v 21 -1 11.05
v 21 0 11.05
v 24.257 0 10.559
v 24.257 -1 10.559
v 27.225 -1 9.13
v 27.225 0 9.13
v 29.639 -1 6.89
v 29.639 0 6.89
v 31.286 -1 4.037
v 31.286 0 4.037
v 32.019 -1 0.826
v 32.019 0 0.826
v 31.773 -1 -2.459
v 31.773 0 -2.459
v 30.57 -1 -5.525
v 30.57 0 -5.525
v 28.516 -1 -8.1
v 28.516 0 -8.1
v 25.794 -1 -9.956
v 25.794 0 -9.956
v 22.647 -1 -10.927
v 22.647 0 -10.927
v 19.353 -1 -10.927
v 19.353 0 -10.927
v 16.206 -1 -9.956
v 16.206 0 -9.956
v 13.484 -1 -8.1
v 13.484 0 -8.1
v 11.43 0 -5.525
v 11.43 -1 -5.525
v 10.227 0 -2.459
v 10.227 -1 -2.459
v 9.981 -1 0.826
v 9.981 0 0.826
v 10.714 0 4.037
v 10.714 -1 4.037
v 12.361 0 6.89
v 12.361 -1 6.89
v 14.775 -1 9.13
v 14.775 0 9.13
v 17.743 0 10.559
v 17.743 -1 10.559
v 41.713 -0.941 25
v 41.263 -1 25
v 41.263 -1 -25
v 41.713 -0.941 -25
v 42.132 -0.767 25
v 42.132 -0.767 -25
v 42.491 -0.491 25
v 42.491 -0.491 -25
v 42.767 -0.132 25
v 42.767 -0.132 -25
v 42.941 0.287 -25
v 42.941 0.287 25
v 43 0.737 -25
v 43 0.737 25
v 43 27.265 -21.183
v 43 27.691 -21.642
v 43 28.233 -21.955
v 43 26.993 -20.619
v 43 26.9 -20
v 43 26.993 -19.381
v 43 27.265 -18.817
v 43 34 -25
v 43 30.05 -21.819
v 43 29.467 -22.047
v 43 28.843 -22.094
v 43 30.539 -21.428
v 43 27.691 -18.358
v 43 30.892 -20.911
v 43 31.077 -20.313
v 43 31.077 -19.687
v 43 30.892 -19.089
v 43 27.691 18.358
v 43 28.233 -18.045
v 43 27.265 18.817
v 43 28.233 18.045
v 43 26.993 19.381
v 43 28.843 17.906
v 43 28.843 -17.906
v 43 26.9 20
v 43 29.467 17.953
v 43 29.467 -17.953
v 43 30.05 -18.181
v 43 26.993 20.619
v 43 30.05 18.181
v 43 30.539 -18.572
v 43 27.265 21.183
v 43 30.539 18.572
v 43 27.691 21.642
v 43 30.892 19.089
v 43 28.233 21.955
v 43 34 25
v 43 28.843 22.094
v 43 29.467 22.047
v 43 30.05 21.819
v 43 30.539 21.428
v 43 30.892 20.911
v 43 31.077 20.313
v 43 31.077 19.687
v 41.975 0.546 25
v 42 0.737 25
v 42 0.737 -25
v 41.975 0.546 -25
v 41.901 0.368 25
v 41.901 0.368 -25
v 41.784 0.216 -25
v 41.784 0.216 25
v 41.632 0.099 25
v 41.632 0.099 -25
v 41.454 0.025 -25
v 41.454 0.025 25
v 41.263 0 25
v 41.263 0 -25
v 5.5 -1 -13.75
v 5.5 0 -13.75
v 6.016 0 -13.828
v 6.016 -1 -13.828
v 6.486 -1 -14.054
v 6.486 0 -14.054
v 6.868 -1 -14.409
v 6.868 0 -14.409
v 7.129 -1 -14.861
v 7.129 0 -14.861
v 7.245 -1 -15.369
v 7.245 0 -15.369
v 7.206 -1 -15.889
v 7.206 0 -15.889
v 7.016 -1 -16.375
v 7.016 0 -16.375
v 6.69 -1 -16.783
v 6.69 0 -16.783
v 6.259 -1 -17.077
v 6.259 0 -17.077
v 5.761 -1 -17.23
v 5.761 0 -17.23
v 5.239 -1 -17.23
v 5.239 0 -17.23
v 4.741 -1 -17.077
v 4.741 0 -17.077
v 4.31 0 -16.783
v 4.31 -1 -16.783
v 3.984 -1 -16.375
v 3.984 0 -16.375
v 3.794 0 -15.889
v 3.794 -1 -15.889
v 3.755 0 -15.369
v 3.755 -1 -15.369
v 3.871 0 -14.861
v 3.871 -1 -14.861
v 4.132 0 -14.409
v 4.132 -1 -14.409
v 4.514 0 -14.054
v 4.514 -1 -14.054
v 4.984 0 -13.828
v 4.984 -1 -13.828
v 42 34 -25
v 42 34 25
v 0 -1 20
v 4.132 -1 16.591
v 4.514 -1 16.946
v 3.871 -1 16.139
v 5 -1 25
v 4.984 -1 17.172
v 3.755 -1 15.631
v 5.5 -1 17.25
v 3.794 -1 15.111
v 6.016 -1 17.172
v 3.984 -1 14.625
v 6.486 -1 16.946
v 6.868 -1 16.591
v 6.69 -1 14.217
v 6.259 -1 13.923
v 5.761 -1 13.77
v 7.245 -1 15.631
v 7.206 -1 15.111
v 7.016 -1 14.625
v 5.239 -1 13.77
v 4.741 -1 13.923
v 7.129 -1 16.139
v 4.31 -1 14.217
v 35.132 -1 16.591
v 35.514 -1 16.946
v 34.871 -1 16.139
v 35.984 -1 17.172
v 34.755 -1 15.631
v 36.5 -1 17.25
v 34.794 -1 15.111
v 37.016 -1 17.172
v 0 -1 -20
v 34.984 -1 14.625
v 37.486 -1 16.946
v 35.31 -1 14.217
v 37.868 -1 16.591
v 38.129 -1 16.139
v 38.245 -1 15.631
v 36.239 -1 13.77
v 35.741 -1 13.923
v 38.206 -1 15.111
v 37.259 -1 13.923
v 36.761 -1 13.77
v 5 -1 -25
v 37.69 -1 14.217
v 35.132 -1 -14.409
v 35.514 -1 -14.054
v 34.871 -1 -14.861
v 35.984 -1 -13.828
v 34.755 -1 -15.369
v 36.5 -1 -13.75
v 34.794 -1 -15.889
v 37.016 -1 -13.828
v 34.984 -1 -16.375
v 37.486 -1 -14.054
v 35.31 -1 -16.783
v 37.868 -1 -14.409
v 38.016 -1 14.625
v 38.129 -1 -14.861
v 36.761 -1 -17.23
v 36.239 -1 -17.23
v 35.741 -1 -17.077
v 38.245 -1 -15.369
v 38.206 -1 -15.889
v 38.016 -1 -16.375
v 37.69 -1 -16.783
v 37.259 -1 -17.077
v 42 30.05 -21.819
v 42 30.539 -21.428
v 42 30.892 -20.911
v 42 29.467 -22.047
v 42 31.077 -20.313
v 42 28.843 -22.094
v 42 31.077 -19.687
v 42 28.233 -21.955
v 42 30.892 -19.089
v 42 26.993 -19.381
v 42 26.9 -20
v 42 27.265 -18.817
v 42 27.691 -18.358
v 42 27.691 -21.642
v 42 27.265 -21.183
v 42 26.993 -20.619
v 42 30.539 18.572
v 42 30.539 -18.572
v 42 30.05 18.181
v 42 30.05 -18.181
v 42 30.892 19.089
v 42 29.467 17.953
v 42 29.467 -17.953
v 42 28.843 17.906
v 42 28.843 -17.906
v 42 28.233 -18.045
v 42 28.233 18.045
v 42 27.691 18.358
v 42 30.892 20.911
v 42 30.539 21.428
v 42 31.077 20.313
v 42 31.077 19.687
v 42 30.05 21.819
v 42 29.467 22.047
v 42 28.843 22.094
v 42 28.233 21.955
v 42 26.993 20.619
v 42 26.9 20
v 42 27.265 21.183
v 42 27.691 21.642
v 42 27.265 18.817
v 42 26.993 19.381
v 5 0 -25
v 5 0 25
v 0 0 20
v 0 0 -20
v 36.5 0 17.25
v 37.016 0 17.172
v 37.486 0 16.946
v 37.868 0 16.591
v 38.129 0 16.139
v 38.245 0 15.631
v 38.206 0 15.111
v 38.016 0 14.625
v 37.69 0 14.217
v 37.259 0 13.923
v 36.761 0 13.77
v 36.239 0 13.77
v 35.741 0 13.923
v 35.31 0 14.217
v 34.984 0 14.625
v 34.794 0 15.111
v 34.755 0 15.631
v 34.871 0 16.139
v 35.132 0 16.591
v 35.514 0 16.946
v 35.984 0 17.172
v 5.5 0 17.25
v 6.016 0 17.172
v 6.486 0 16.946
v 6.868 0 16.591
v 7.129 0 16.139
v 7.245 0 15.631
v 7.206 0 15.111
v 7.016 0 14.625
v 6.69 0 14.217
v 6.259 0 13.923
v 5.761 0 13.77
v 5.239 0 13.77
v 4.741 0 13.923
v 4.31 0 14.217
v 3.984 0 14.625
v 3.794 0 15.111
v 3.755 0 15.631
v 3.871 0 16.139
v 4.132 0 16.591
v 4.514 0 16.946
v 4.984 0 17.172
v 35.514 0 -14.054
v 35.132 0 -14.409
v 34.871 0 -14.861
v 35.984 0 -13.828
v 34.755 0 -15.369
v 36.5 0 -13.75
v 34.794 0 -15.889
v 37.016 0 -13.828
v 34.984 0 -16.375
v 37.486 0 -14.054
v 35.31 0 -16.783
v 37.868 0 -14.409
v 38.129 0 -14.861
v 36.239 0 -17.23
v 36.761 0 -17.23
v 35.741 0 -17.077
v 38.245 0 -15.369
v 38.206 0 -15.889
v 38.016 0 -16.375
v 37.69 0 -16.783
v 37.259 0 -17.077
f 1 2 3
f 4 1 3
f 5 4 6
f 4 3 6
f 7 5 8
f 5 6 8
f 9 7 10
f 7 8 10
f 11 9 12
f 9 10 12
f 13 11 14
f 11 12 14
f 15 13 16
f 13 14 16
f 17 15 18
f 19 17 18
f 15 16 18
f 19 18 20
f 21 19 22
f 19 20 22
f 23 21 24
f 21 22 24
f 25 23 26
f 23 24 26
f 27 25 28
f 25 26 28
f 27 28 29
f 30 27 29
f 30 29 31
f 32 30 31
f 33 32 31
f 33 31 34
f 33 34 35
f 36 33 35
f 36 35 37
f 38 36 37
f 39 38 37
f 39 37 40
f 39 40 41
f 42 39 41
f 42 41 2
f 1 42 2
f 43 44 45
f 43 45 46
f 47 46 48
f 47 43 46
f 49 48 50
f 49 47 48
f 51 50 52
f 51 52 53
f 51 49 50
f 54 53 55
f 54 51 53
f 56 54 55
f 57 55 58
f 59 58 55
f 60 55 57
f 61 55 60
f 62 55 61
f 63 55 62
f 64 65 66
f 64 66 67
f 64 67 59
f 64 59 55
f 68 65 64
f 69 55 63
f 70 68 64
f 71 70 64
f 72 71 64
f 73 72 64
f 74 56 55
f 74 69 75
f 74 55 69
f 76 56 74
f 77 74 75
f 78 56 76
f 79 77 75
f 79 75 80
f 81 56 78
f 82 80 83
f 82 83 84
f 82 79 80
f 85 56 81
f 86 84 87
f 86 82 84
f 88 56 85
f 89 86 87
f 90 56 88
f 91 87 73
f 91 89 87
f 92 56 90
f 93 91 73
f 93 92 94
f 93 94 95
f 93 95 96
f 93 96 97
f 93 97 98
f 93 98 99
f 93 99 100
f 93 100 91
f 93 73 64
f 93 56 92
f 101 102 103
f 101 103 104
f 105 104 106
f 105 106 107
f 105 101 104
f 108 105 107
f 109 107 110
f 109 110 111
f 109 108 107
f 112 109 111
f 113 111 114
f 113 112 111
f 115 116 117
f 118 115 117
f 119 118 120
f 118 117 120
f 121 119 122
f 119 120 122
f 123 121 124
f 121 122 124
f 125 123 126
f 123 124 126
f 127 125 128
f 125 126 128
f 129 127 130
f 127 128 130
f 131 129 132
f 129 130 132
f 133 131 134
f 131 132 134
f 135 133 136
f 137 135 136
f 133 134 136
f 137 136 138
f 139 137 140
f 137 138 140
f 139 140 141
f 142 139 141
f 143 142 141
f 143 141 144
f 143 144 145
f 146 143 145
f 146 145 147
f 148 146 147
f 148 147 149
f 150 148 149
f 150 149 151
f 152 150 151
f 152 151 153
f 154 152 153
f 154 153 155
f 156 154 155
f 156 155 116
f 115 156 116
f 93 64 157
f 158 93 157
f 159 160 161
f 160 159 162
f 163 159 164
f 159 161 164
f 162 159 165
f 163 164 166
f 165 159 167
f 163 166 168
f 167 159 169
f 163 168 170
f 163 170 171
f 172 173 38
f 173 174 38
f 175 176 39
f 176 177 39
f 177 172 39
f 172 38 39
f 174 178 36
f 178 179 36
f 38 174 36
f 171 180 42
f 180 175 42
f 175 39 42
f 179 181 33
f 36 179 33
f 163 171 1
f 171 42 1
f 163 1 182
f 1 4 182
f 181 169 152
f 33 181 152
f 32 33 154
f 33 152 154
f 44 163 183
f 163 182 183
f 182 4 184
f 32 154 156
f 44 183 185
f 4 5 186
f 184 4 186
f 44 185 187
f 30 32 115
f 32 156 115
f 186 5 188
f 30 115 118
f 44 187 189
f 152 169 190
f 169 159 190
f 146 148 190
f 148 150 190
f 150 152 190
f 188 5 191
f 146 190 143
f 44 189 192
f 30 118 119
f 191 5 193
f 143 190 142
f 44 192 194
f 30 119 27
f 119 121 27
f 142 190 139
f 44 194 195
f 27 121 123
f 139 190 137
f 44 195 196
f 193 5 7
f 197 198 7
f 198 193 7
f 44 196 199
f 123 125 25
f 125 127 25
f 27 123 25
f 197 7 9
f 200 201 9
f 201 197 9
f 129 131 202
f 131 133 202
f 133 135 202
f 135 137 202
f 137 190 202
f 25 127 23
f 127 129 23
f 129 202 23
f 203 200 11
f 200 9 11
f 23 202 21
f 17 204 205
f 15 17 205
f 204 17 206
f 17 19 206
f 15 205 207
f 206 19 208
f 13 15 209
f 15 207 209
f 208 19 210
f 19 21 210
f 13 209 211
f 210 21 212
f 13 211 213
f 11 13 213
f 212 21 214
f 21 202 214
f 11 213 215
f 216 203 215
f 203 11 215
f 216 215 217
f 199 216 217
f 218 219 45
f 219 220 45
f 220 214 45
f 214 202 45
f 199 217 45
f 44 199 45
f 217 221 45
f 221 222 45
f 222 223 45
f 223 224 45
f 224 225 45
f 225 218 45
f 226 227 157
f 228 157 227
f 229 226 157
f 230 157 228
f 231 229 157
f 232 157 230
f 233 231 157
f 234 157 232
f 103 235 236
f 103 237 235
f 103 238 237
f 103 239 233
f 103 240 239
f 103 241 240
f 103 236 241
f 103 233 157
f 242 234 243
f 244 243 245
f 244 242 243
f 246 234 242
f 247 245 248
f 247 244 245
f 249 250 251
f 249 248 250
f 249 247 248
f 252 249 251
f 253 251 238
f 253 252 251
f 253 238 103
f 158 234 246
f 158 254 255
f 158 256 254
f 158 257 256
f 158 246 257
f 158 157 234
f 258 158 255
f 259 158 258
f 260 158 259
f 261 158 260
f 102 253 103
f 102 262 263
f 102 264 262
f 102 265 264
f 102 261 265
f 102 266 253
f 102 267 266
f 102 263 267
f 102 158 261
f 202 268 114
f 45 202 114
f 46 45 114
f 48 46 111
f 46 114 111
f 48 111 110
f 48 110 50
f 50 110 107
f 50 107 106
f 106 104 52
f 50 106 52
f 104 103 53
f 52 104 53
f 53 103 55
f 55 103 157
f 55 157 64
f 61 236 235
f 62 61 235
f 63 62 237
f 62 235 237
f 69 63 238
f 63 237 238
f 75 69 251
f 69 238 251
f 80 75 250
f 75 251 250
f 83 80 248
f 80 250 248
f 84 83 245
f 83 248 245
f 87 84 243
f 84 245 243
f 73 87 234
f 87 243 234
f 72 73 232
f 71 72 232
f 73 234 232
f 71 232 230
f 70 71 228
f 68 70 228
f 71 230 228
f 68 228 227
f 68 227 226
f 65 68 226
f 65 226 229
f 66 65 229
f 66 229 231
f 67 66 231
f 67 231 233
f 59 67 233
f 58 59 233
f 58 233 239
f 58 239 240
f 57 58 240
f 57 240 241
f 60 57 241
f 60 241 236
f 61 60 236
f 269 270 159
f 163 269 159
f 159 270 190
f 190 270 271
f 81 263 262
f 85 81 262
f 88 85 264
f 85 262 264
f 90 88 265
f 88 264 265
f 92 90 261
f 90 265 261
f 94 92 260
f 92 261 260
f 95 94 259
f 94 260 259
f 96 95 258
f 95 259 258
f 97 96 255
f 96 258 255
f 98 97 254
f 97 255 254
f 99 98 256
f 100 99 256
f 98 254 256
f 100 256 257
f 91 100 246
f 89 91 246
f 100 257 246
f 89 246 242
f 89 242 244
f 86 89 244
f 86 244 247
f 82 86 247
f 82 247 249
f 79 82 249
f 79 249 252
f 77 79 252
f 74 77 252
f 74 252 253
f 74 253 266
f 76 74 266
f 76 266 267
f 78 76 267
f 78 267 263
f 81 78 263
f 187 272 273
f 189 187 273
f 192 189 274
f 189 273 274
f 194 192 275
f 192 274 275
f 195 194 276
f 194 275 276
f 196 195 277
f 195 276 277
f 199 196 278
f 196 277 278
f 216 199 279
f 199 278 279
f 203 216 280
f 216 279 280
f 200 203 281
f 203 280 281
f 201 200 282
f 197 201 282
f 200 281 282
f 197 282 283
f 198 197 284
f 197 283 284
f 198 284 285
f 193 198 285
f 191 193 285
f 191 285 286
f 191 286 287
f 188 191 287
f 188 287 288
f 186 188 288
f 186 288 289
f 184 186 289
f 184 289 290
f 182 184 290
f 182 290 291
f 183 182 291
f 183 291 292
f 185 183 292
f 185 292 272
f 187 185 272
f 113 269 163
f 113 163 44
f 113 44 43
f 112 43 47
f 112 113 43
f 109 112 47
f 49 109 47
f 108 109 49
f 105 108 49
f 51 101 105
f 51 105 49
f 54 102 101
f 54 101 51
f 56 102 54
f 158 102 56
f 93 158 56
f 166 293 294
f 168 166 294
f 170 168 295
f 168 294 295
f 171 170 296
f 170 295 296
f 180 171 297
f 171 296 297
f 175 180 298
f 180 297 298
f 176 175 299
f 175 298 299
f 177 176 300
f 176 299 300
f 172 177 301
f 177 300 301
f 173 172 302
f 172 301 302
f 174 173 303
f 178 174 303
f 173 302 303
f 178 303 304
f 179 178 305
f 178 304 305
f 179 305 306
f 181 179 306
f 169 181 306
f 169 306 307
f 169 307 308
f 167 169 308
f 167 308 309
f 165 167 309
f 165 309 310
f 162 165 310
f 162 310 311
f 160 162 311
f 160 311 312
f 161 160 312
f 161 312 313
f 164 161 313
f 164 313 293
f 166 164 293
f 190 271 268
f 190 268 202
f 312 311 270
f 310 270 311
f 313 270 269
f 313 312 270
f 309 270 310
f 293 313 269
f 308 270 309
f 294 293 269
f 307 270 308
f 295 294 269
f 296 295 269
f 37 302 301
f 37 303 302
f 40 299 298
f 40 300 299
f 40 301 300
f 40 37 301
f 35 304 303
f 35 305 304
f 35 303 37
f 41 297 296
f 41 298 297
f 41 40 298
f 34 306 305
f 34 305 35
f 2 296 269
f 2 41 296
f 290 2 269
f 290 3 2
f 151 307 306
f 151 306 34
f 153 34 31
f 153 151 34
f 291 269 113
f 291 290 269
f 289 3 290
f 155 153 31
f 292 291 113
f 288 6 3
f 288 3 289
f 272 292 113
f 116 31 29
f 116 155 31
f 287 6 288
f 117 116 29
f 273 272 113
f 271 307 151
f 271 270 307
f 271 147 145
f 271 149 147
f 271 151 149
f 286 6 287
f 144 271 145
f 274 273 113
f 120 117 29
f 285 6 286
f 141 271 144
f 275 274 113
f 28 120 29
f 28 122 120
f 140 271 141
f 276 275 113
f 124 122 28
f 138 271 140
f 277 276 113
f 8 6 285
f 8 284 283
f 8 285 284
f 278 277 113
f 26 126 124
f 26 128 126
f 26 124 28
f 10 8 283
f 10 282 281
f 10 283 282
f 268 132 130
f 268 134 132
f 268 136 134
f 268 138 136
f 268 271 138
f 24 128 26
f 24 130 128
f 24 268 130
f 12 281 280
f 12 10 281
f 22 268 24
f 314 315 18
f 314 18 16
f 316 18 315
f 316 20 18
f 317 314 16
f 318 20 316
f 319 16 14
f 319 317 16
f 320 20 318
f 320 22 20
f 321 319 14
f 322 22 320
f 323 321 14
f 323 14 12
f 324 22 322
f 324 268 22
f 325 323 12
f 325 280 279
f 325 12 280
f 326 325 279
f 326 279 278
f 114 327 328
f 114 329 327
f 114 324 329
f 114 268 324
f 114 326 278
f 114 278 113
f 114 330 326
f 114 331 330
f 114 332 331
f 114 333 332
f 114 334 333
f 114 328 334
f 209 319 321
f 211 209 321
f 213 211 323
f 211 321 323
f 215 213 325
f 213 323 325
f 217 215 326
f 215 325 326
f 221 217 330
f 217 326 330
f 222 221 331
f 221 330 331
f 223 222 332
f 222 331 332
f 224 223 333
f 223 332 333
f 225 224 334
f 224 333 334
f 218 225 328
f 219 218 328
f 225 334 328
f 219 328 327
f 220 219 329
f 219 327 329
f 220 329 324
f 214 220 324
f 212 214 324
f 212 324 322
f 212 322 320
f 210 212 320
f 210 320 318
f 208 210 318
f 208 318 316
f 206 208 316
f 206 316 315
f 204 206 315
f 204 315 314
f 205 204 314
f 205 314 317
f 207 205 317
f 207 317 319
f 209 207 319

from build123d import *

# Parameters (mm, degrees)
SKETCH1_W                    = 43
SKETCH1_H                    = 50
BASE_FLANGE1_DEPTH           = 1
SKETCH2_R                    = 11.05
SKETCH2_R_2                  = 1.75
CUT_EXTRUDE1_DEPTH           = 50.749371855
EDGE_FLANGE1_STRIP_W         = 5.4732
EDGE_FLANGE1_STRIP_H         = 1
EDGE_FLANGE1_STRIP_CUT_DEPTH = 50
EDGE_FLANGE1_DEPTH           = 50
CUT_EXTRUDE2_REACH           = 61.54
SKETCH8_R                    = 2.1
CHAMFER1_SIZE                = 5


# Sheet-metal steps are written as plain solids
with BuildPart() as part:
    # Sketch1 → Base-Flange1 (new body)
    with BuildSketch(Plane(origin=(0, 0, 0), x_dir=(1, 0, 0), z_dir=(0, 1, 0))):
        with Locations((21.5, 0)):
            Rectangle(SKETCH1_W, SKETCH1_H)
    extrude(amount=-BASE_FLANGE1_DEPTH)

    # Sketch2 → Cut-Extrude1 (cut, through all)
    with BuildSketch(Plane(origin=(0, 0, 0), x_dir=(1, 0, 0), z_dir=(0, 1, 0))):
        with Locations(Location((21, 0, 0), (0, 0, 270))):
            Circle(SKETCH2_R)
        with Locations(Location((5.5, 15.5, 0), (0, 0, 270))):
            Circle(SKETCH2_R_2)
        with Locations(Location((36.5, 15.5, 0), (0, 0, 270))):
            Circle(SKETCH2_R_2)
        with Locations(Location((36.5, -15.5, 0), (0, 0, 270))):
            Circle(SKETCH2_R_2)
        with Locations(Location((5.5, -15.5, 0), (0, 0, 270))):
            Circle(SKETCH2_R_2)
    extrude(amount=-CUT_EXTRUDE1_DEPTH, mode=Mode.SUBTRACT)

    # Edge-Flange1 strip (across the edge) → Edge-Flange1 strip cut (cut)
    with BuildSketch(Plane(origin=(43, 0, 25), x_dir=(-1, 0, 0), z_dir=(0, 0, -1))):
        with Locations((-1, -0.5)):
            Rectangle(EDGE_FLANGE1_STRIP_W, EDGE_FLANGE1_STRIP_H)
    extrude(amount=EDGE_FLANGE1_STRIP_CUT_DEPTH, mode=Mode.SUBTRACT)

    # Edge-Flange1 section (across the edge) → Edge-Flange1 (add)
    with BuildSketch(Plane(origin=(43, 0, 25), x_dir=(-1, 0, 0), z_dir=(0, 0, -1))):
        with BuildLine():
            Line((0, 0.7366), (0, 34))
            Line((0, 34), (1, 34))
            Line((1, 34), (1, 0.7366))
            ThreePointArc((1, 0.7366), (1.215745145, 0.215745145), (1.7366, 0))
            Line((1.7366, 0), (1.7366, -1))
            ThreePointArc((1.7366, -1), (0.508638364, -0.491361636), (0, 0.7366))
        make_face()
    extrude(amount=EDGE_FLANGE1_DEPTH)

    # Sketch8 → Cut-Extrude2 (cut, up to next)
    with BuildSketch(Plane.ZY.offset(-42), mode=Mode.PRIVATE) as cut_extrude2_sk1:
        with Locations(Location((20, 29, 0), (0, 0, 270))):
            Circle(SKETCH8_R)
    cut_extrude2_tool1 = extrude(cut_extrude2_sk1.sketch, amount=-CUT_EXTRUDE2_REACH, mode=Mode.PRIVATE) & part.part
    # Sketch8 → Cut-Extrude2 (cut, up to next)
    with BuildSketch(Plane.ZY.offset(-42), mode=Mode.PRIVATE) as cut_extrude2_sk2:
        with Locations(Location((-20, 29, 0), (0, 0, 270))):
            Circle(SKETCH8_R)
    cut_extrude2_tool2 = extrude(cut_extrude2_sk2.sketch, amount=-CUT_EXTRUDE2_REACH, mode=Mode.PRIVATE) & part.part
    add(cut_extrude2_tool1.solids().sort_by_distance((42, 29, 20))[0], mode=Mode.SUBTRACT)
    add(cut_extrude2_tool2.solids().sort_by_distance((42, 29, -20))[0], mode=Mode.SUBTRACT)

    # Chamfer1
    chamfer1_edges = [part.edges().sort_by_distance(p)[0] for p in [
        (0, -0.5, -25),
        (0, -0.5, 25),
    ]]
    chamfer(chamfer1_edges, length=CHAMFER1_SIZE)


solid = part.part
